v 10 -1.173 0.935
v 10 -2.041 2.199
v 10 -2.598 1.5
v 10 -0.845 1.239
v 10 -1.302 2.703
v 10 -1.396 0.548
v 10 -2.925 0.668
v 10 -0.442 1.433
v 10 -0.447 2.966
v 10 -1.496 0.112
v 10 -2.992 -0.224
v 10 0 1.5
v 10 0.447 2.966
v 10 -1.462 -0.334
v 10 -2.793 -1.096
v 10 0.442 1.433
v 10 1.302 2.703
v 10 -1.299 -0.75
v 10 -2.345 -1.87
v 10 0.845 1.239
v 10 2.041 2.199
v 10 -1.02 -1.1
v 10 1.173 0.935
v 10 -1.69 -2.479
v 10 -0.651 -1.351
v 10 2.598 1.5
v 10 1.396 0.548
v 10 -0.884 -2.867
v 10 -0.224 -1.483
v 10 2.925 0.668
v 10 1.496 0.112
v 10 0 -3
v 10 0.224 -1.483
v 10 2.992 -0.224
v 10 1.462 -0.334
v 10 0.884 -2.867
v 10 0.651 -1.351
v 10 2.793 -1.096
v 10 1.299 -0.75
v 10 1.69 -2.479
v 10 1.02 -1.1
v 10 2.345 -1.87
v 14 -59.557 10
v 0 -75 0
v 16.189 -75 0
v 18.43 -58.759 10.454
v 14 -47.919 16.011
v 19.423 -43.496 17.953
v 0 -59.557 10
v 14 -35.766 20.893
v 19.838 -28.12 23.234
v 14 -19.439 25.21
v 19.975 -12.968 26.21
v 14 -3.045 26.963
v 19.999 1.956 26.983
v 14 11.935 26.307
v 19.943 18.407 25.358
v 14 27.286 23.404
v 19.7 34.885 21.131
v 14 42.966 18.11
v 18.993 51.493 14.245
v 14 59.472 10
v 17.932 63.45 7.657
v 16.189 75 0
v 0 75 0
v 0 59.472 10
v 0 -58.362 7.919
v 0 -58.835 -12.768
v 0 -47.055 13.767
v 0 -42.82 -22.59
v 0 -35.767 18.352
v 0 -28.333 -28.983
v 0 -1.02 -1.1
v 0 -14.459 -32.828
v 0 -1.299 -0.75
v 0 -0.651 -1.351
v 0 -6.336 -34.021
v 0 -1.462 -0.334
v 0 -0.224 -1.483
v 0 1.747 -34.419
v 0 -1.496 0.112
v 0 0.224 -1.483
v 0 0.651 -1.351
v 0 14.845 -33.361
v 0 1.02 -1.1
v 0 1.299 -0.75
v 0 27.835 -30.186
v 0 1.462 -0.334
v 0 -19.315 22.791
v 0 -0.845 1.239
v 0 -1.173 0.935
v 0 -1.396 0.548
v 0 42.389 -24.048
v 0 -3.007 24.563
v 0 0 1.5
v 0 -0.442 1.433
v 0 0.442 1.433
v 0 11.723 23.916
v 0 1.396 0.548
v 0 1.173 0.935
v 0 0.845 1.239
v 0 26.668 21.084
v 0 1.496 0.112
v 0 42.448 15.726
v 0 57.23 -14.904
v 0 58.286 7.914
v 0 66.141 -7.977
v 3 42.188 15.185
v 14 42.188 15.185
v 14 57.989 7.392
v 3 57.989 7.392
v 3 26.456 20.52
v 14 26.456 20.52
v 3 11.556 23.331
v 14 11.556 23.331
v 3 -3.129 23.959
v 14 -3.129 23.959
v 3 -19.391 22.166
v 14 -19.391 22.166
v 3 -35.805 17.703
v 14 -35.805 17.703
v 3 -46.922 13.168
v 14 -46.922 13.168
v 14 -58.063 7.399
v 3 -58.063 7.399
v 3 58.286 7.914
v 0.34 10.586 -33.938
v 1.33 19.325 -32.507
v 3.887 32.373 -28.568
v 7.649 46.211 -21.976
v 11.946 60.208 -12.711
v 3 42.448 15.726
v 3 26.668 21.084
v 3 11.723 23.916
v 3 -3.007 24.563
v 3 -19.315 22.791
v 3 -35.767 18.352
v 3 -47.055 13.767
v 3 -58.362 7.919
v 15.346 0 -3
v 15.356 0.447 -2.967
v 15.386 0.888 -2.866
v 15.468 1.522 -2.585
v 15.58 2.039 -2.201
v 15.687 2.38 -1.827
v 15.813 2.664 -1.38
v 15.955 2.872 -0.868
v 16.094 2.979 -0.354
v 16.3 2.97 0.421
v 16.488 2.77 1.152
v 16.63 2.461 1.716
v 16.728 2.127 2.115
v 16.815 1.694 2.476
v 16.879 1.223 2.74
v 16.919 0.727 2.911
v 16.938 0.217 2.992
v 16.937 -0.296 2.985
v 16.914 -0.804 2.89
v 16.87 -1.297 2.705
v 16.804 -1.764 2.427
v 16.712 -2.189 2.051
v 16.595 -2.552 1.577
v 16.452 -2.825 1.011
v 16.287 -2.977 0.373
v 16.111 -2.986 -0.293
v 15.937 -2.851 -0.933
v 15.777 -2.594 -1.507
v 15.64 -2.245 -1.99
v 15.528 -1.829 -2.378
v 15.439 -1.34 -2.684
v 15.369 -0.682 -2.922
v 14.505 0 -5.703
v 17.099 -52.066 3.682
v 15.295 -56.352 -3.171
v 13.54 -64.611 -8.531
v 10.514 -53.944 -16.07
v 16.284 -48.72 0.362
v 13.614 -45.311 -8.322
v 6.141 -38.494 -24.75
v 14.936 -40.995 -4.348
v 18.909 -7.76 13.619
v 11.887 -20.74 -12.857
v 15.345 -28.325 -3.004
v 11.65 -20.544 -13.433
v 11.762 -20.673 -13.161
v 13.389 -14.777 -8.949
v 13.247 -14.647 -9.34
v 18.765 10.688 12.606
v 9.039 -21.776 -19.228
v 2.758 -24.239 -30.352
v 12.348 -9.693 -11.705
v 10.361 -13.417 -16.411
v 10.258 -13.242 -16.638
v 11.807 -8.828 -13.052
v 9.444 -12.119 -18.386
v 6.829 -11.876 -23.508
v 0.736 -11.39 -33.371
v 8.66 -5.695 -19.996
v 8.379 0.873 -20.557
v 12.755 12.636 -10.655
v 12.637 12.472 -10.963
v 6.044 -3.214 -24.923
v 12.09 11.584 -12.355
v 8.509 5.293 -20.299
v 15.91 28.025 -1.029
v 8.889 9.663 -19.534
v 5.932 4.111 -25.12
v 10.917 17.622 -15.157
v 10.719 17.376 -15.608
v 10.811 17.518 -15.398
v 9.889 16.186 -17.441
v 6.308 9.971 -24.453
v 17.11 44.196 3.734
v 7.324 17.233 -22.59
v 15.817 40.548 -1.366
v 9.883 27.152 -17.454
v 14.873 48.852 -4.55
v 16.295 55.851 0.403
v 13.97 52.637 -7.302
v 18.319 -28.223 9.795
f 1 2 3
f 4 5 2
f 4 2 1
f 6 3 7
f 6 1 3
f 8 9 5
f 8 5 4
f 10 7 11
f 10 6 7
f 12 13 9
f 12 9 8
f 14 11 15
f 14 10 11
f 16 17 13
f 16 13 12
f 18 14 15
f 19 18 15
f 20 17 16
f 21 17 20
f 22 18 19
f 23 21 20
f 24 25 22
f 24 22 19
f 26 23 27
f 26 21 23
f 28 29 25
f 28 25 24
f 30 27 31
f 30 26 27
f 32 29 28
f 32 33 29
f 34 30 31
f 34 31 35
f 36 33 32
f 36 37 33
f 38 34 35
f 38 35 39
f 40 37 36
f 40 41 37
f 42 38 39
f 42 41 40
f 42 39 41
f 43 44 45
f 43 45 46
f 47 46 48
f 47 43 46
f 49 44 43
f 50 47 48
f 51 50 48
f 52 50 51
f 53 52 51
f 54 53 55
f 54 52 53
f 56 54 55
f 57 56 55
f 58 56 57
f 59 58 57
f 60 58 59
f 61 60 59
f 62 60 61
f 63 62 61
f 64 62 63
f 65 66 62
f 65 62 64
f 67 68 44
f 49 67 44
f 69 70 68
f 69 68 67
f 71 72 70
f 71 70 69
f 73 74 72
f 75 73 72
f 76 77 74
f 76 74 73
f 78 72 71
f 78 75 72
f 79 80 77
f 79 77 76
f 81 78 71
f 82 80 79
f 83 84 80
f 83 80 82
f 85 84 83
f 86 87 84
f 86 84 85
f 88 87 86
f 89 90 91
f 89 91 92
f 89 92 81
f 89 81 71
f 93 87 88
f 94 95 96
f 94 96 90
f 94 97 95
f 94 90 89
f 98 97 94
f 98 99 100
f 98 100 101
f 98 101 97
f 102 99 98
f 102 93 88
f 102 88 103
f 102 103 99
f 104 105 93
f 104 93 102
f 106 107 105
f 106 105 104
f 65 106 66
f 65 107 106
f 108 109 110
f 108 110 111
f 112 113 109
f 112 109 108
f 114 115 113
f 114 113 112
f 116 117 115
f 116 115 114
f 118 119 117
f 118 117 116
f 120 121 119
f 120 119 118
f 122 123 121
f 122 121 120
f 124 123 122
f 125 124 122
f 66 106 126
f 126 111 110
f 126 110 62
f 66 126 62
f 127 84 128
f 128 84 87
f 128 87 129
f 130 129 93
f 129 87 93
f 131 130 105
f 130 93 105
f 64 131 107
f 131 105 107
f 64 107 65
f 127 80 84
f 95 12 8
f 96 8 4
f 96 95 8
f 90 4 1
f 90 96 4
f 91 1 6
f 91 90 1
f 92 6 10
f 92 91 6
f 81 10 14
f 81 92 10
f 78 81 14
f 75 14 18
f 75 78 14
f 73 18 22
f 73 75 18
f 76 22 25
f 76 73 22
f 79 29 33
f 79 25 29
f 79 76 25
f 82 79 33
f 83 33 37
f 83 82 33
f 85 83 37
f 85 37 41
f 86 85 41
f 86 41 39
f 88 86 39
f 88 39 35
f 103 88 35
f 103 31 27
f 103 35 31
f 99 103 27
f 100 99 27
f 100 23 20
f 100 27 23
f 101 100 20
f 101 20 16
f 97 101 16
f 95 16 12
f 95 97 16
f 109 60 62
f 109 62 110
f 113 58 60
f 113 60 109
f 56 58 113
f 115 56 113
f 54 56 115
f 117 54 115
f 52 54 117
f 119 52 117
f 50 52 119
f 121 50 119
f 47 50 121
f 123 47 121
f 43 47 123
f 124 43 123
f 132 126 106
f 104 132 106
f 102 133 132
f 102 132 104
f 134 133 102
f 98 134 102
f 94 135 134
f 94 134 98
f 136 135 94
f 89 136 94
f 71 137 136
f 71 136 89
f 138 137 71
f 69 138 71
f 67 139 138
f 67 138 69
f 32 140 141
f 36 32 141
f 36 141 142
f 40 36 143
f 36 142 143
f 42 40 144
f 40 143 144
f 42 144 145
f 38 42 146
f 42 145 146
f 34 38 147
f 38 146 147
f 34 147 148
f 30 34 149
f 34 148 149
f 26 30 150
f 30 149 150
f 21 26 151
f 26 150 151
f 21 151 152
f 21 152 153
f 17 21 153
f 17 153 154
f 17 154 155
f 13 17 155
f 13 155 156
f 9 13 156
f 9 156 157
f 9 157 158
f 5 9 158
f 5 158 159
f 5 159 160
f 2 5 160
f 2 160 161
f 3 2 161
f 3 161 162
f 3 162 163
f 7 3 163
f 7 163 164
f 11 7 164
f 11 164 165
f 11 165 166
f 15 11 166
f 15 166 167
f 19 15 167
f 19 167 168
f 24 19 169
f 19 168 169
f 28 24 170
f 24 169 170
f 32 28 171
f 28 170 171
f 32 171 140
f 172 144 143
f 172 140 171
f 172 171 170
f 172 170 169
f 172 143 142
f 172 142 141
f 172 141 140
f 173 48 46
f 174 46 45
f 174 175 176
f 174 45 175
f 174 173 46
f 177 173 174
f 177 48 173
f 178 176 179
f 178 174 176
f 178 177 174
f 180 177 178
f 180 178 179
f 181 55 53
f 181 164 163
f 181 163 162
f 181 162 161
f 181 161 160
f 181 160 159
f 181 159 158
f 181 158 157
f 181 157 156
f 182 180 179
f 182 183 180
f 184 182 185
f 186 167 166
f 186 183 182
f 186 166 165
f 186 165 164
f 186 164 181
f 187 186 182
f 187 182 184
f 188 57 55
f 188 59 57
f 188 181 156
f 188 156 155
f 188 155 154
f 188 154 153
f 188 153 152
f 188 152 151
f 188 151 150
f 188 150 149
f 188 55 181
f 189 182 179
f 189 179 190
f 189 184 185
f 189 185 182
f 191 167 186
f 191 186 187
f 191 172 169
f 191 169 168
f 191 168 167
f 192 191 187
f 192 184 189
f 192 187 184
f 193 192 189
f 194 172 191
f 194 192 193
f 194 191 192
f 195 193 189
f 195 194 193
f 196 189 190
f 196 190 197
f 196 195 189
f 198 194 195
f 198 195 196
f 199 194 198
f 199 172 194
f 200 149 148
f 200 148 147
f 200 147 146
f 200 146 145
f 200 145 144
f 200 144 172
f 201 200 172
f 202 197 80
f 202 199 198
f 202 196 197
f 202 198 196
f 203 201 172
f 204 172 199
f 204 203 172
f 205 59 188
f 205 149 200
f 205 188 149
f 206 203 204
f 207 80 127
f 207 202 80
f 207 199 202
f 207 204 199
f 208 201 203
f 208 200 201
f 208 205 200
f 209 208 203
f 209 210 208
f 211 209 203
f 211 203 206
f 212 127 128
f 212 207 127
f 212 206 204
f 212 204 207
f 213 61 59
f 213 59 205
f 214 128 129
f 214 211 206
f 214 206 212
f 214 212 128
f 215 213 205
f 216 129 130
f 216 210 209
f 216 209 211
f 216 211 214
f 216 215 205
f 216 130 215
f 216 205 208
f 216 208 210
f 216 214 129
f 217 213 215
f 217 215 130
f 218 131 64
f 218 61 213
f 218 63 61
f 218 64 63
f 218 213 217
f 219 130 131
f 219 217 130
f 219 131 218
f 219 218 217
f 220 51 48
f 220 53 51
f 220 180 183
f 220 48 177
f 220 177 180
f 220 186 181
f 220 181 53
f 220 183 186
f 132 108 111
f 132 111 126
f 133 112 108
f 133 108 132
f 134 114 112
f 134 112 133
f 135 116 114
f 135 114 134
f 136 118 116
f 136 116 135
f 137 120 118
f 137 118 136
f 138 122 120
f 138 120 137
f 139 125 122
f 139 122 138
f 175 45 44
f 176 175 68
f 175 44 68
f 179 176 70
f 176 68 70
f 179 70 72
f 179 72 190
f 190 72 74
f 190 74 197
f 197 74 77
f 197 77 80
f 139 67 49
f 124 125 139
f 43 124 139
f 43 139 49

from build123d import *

# Parameters (mm, degrees)
BOSS_EXTRUDE1_DEPTH = 20
SKETCH3_R           = 1.5
CUT_EXTRUDE2_DEPTH  = 20
SKETCH4_R           = 3
CUT_EXTRUDE4_DEPTH  = 10
CUT_EXTRUDE1_START  = -75.0000001
CUT_EXTRUDE1_DEPTH  = 150.0000002


# Read off the part's stored shape, not the designer's step: Cut-Extrude1
with BuildPart() as part:
    # Sketch1 → Boss-Extrude1 (new body)
    with BuildSketch(Plane(origin=(0, 0, 0), x_dir=(0, 0, -1), z_dir=(1, 0, 0))):
        with BuildLine():
            add(Edge.make_bspline(
                [(0, -75), (-54.00752431, -0.229525707), (0, 75)],
                knots=[0, 0, 0, 1, 1, 1], degree=2))
            add(Edge.make_bspline(
                [(0, -75), (68.837827029, 3.494171235), (0, 75)],
                knots=[0, 0, 0, 1, 1, 1], degree=2))
        make_face()
    extrude(amount=BOSS_EXTRUDE1_DEPTH)

    # Sketch3 → Cut-Extrude2 (cut)
    with BuildSketch(Plane(origin=(0, 0, 0), x_dir=(0, 0, -1), z_dir=(1, 0, 0))):
        with Locations(Location((0, 0, 0), (0, 0, 180))):
            Circle(SKETCH3_R)
    extrude(amount=CUT_EXTRUDE2_DEPTH, mode=Mode.SUBTRACT)

    # Sketch4 → Cut-Extrude4 (cut)
    with BuildSketch(Plane(origin=(20, 0, 0), x_dir=(0, 0, -1), z_dir=(1, 0, 0))):
        Circle(SKETCH4_R)
    extrude(amount=-CUT_EXTRUDE4_DEPTH, mode=Mode.SUBTRACT)

    # Cut-Extrude1 outline → Cut-Extrude1 (cut)
    with BuildSketch(Plane(origin=(0, 0, 0), x_dir=(0, 0, -1), z_dir=(0, -1, 0)).offset(CUT_EXTRUDE1_START)):
        with BuildLine():
            Line((34.418913514, 0), (34.418913514, 20))
            Line((34.418913514, 20), (-27.003762155, 20))
            add(Edge.make_bspline(
                [(-27.003762155, 20), (7.680747014, 19.015790773), (34.418913514, 0)],
                knots=[0, 0, 0, 1, 1, 1], degree=2))
        make_face()
    extrude(amount=CUT_EXTRUDE1_DEPTH, mode=Mode.SUBTRACT)

    # Cut-Sweep2: sweep along a path in Sketch6
    with BuildLine() as cut_sweep2_path:  # in the path sketch's own coordinates; laid on its plane below (add() does not lay a ready-made edge on the line's plane)
        add(Edge.make_bspline(
            [(10, 59.471843264), (21.504457752, 39.289752245), (32.671682873, -0.43393523), (21.167225121, -40.061270692), (10, -59.556840941)],
            knots=[0.103237719, 0.103237719, 0.103237719, 0.103237719, 0.505901687, 0.896762281, 0.896762281, 0.896762281, 0.896762281], degree=3))
    # Sketch5 → Cut-Sweep2 (sweep, cut)
    with BuildSketch(Plane(origin=(0, 0, 0), x_dir=(1, 0, 0), z_dir=(0, 1, 0))):
        Polygon((14, -30.003762155), (14, -24.003762155), (3, -24.003762155), (3, -24.603762155), (0, -24.603762155), (0, -30.003762155), align=None)
    sweep(path=Plane.ZY * cut_sweep2_path.line, mode=Mode.SUBTRACT)


solid = part.part
